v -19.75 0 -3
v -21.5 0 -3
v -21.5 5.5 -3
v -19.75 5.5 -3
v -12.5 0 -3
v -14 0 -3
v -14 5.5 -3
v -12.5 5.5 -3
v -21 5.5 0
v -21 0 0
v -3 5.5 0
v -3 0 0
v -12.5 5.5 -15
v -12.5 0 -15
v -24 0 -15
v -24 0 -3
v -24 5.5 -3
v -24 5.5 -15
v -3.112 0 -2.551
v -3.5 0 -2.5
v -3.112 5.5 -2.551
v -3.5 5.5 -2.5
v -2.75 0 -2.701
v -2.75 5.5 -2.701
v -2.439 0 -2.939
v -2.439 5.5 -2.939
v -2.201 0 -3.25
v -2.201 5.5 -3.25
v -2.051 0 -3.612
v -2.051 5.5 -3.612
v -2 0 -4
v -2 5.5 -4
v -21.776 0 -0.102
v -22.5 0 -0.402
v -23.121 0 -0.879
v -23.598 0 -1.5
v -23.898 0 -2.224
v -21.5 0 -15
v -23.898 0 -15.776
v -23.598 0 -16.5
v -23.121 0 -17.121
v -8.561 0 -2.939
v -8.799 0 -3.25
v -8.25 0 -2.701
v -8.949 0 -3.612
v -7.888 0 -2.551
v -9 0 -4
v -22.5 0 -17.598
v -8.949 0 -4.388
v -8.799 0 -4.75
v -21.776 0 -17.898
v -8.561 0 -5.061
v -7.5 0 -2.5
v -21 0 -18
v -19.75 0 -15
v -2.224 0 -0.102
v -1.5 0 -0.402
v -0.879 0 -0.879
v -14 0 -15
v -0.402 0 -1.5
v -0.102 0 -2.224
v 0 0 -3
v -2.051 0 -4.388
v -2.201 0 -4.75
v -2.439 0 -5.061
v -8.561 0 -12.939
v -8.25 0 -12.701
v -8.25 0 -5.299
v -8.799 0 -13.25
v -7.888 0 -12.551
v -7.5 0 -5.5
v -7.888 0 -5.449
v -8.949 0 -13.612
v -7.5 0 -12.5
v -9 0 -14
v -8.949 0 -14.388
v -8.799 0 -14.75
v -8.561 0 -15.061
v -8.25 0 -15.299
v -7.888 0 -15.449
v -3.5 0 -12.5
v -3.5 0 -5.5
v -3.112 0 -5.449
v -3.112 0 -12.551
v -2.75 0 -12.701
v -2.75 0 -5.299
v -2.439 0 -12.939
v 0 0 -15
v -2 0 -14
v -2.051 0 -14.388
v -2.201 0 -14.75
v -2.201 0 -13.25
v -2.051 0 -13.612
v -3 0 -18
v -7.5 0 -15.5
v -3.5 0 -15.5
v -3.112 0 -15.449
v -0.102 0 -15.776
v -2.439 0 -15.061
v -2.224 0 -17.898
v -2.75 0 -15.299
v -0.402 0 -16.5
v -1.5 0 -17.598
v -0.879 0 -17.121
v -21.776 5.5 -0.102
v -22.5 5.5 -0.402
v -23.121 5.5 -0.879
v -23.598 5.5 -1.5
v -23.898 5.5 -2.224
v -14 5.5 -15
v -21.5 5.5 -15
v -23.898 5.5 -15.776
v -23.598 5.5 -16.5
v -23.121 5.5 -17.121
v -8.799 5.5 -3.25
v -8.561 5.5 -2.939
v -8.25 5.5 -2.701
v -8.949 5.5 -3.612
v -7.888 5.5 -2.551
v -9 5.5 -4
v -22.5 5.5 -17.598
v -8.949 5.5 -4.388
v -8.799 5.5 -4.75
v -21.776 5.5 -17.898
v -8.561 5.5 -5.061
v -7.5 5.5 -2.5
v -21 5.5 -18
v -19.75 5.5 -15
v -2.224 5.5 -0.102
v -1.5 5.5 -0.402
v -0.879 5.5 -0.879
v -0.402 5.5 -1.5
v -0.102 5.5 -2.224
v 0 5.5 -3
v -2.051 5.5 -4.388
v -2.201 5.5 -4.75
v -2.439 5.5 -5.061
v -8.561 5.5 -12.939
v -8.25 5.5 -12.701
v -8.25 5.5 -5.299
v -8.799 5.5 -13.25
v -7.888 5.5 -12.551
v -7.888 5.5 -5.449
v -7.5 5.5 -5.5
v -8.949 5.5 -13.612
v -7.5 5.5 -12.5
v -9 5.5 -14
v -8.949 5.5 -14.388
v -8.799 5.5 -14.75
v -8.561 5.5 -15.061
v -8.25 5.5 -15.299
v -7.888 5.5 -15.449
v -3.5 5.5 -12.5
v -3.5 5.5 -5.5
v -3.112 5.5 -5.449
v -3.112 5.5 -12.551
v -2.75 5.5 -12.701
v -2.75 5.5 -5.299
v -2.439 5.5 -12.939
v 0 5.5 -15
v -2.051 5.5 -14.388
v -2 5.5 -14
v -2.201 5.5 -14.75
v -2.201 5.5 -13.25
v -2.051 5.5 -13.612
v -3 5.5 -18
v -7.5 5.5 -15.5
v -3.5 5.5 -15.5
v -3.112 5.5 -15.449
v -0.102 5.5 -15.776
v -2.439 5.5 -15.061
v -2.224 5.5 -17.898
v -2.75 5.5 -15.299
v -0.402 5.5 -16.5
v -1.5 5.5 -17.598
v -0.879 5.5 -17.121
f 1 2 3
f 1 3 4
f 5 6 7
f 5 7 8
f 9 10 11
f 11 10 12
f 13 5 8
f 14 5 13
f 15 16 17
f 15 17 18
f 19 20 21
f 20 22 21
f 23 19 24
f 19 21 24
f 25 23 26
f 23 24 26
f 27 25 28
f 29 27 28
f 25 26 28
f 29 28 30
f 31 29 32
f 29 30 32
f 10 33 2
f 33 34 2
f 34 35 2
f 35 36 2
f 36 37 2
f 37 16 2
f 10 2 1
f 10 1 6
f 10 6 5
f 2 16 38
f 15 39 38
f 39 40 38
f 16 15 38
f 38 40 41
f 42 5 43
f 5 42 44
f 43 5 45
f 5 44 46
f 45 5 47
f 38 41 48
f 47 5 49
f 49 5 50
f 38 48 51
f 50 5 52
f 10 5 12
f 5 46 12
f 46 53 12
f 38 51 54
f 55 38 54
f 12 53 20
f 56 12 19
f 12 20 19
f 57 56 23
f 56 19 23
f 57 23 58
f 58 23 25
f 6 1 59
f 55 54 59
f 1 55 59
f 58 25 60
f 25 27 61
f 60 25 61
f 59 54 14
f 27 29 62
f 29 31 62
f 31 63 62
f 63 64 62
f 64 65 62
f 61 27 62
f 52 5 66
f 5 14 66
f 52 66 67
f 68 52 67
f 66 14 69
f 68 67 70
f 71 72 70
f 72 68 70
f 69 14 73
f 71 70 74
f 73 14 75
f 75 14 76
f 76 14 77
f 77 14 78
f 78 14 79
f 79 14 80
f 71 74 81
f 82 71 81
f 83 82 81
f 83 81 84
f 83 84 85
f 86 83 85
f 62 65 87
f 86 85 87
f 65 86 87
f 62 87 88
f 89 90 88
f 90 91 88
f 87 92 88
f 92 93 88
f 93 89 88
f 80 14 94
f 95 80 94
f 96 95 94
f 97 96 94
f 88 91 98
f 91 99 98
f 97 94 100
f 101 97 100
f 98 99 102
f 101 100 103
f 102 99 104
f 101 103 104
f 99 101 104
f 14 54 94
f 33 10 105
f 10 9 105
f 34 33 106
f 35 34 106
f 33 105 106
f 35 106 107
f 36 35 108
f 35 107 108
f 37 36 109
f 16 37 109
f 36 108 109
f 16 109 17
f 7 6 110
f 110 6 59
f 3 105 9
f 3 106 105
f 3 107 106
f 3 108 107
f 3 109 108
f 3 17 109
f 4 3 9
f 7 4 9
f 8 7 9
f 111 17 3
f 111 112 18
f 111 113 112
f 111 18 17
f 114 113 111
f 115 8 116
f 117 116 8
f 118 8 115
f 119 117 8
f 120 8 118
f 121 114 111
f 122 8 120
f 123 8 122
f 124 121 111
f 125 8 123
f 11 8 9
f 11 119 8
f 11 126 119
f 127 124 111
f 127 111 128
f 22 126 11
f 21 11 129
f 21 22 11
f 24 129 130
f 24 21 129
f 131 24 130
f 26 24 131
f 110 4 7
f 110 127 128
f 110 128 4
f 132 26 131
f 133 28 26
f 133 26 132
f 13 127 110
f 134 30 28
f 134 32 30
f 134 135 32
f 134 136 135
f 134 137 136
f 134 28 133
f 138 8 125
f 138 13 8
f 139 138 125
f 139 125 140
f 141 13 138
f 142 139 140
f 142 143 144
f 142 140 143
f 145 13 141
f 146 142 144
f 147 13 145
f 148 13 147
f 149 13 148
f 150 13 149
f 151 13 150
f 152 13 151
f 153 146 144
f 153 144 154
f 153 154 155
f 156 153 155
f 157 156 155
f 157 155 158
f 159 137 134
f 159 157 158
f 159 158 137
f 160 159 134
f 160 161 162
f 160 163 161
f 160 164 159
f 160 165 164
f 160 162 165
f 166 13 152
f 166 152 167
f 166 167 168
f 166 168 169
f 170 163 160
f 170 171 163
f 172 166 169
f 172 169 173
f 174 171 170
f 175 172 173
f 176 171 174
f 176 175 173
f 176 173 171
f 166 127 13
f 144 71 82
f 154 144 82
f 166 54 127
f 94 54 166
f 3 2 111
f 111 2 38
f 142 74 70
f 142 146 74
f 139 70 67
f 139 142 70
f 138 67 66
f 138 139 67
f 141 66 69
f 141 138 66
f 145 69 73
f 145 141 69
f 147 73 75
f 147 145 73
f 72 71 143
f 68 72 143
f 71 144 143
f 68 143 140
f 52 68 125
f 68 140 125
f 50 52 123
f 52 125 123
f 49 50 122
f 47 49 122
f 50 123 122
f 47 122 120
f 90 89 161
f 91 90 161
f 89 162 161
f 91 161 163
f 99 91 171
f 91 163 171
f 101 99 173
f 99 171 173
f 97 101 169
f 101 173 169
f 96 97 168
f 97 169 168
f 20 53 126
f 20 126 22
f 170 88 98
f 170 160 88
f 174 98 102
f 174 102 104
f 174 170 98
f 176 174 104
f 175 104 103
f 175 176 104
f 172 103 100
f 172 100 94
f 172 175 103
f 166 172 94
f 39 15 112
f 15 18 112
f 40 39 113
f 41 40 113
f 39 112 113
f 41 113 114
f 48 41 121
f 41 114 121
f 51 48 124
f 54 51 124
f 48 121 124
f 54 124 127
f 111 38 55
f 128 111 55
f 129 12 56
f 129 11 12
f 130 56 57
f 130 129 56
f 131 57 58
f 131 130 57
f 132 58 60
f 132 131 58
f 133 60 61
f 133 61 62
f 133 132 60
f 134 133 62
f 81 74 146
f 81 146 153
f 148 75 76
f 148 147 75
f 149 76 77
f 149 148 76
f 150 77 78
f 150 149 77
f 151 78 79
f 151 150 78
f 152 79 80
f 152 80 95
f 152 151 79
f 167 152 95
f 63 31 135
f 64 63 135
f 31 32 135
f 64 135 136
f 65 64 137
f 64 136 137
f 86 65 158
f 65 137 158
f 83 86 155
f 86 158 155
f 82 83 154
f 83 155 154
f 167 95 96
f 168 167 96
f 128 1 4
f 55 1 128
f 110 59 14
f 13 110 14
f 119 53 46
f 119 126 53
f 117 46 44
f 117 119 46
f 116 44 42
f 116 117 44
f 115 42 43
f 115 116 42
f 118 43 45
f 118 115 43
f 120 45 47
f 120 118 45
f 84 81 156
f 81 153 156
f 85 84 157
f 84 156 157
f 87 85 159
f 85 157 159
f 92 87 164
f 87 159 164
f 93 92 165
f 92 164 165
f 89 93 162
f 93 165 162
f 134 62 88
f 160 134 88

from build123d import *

# Parameters (mm, degrees)
SKETCH1_W           = 24
SKETCH1_H           = 18
SKETCH1_W_2         = 1.5
SKETCH1_H_2         = 12
SKETCH1_W_3         = 1.75
SKETCH1_W_4         = 7
SKETCH1_H_3         = 3
BOSS_EXTRUDE1_DEPTH = 5.5
FILLET1_R           = 3
FILLET2_R           = 3
FILLET4_R           = 1.5
FILLET5_R           = 1.5


with BuildPart() as part:
    # Sketch1 → Boss-Extrude1 (new body)
    with BuildSketch(Plane(origin=(0, 0, 0), x_dir=(1, 0, 0), z_dir=(0, 1, 0))):
        with Locations((-12, 9)):
            Rectangle(SKETCH1_W, SKETCH1_H)
        with Locations((-13.25, 9)):
            Rectangle(SKETCH1_W_2, SKETCH1_H_2, mode=Mode.SUBTRACT)
        with Locations((-20.625, 9)):
            Rectangle(SKETCH1_W_3, SKETCH1_H_2, mode=Mode.SUBTRACT)
        with Locations((-5.5, 14)):
            Rectangle(SKETCH1_W_4, SKETCH1_H_3, mode=Mode.SUBTRACT)
        with Locations((-5.5, 4)):
            Rectangle(SKETCH1_W_4, SKETCH1_H_3, mode=Mode.SUBTRACT)
    extrude(amount=BOSS_EXTRUDE1_DEPTH)

    # Fillet1
    fillet1_edges = [part.edges().sort_by_distance(p)[0] for p in [
        (0, 2.75, 0),
    ]]
    fillet(fillet1_edges, radius=FILLET1_R)

    # Fillet2
    fillet2_edges = [part.edges().sort_by_distance(p)[0] for p in [
        (-24, 2.75, 0),
        (-24, 2.75, -18),
        (0, 2.75, -18),
    ]]
    fillet(fillet2_edges, radius=FILLET2_R)

    # Fillet4
    fillet4_edges = [part.edges().sort_by_distance(p)[0] for p in [
        (-9, 2.75, -15.5),
        (-9, 2.75, -5.5),
        (-9, 2.75, -12.5),
        (-9, 2.75, -2.5),
        (-2, 2.75, -2.5),
    ]]
    fillet(fillet4_edges, radius=FILLET4_R - 0.0001)  # a hair under: the kernel refuses the full size

    # Fillet5
    fillet5_edges = [part.edges().sort_by_distance(p)[0] for p in [
        (-2, 2.75, -12.5),
        (-2, 2.75, -5.5),
        (-2, 2.75, -15.5),
    ]]
    fillet(fillet5_edges, radius=FILLET5_R - 0.0001)  # a hair under: the kernel refuses the full size


solid = part.part
